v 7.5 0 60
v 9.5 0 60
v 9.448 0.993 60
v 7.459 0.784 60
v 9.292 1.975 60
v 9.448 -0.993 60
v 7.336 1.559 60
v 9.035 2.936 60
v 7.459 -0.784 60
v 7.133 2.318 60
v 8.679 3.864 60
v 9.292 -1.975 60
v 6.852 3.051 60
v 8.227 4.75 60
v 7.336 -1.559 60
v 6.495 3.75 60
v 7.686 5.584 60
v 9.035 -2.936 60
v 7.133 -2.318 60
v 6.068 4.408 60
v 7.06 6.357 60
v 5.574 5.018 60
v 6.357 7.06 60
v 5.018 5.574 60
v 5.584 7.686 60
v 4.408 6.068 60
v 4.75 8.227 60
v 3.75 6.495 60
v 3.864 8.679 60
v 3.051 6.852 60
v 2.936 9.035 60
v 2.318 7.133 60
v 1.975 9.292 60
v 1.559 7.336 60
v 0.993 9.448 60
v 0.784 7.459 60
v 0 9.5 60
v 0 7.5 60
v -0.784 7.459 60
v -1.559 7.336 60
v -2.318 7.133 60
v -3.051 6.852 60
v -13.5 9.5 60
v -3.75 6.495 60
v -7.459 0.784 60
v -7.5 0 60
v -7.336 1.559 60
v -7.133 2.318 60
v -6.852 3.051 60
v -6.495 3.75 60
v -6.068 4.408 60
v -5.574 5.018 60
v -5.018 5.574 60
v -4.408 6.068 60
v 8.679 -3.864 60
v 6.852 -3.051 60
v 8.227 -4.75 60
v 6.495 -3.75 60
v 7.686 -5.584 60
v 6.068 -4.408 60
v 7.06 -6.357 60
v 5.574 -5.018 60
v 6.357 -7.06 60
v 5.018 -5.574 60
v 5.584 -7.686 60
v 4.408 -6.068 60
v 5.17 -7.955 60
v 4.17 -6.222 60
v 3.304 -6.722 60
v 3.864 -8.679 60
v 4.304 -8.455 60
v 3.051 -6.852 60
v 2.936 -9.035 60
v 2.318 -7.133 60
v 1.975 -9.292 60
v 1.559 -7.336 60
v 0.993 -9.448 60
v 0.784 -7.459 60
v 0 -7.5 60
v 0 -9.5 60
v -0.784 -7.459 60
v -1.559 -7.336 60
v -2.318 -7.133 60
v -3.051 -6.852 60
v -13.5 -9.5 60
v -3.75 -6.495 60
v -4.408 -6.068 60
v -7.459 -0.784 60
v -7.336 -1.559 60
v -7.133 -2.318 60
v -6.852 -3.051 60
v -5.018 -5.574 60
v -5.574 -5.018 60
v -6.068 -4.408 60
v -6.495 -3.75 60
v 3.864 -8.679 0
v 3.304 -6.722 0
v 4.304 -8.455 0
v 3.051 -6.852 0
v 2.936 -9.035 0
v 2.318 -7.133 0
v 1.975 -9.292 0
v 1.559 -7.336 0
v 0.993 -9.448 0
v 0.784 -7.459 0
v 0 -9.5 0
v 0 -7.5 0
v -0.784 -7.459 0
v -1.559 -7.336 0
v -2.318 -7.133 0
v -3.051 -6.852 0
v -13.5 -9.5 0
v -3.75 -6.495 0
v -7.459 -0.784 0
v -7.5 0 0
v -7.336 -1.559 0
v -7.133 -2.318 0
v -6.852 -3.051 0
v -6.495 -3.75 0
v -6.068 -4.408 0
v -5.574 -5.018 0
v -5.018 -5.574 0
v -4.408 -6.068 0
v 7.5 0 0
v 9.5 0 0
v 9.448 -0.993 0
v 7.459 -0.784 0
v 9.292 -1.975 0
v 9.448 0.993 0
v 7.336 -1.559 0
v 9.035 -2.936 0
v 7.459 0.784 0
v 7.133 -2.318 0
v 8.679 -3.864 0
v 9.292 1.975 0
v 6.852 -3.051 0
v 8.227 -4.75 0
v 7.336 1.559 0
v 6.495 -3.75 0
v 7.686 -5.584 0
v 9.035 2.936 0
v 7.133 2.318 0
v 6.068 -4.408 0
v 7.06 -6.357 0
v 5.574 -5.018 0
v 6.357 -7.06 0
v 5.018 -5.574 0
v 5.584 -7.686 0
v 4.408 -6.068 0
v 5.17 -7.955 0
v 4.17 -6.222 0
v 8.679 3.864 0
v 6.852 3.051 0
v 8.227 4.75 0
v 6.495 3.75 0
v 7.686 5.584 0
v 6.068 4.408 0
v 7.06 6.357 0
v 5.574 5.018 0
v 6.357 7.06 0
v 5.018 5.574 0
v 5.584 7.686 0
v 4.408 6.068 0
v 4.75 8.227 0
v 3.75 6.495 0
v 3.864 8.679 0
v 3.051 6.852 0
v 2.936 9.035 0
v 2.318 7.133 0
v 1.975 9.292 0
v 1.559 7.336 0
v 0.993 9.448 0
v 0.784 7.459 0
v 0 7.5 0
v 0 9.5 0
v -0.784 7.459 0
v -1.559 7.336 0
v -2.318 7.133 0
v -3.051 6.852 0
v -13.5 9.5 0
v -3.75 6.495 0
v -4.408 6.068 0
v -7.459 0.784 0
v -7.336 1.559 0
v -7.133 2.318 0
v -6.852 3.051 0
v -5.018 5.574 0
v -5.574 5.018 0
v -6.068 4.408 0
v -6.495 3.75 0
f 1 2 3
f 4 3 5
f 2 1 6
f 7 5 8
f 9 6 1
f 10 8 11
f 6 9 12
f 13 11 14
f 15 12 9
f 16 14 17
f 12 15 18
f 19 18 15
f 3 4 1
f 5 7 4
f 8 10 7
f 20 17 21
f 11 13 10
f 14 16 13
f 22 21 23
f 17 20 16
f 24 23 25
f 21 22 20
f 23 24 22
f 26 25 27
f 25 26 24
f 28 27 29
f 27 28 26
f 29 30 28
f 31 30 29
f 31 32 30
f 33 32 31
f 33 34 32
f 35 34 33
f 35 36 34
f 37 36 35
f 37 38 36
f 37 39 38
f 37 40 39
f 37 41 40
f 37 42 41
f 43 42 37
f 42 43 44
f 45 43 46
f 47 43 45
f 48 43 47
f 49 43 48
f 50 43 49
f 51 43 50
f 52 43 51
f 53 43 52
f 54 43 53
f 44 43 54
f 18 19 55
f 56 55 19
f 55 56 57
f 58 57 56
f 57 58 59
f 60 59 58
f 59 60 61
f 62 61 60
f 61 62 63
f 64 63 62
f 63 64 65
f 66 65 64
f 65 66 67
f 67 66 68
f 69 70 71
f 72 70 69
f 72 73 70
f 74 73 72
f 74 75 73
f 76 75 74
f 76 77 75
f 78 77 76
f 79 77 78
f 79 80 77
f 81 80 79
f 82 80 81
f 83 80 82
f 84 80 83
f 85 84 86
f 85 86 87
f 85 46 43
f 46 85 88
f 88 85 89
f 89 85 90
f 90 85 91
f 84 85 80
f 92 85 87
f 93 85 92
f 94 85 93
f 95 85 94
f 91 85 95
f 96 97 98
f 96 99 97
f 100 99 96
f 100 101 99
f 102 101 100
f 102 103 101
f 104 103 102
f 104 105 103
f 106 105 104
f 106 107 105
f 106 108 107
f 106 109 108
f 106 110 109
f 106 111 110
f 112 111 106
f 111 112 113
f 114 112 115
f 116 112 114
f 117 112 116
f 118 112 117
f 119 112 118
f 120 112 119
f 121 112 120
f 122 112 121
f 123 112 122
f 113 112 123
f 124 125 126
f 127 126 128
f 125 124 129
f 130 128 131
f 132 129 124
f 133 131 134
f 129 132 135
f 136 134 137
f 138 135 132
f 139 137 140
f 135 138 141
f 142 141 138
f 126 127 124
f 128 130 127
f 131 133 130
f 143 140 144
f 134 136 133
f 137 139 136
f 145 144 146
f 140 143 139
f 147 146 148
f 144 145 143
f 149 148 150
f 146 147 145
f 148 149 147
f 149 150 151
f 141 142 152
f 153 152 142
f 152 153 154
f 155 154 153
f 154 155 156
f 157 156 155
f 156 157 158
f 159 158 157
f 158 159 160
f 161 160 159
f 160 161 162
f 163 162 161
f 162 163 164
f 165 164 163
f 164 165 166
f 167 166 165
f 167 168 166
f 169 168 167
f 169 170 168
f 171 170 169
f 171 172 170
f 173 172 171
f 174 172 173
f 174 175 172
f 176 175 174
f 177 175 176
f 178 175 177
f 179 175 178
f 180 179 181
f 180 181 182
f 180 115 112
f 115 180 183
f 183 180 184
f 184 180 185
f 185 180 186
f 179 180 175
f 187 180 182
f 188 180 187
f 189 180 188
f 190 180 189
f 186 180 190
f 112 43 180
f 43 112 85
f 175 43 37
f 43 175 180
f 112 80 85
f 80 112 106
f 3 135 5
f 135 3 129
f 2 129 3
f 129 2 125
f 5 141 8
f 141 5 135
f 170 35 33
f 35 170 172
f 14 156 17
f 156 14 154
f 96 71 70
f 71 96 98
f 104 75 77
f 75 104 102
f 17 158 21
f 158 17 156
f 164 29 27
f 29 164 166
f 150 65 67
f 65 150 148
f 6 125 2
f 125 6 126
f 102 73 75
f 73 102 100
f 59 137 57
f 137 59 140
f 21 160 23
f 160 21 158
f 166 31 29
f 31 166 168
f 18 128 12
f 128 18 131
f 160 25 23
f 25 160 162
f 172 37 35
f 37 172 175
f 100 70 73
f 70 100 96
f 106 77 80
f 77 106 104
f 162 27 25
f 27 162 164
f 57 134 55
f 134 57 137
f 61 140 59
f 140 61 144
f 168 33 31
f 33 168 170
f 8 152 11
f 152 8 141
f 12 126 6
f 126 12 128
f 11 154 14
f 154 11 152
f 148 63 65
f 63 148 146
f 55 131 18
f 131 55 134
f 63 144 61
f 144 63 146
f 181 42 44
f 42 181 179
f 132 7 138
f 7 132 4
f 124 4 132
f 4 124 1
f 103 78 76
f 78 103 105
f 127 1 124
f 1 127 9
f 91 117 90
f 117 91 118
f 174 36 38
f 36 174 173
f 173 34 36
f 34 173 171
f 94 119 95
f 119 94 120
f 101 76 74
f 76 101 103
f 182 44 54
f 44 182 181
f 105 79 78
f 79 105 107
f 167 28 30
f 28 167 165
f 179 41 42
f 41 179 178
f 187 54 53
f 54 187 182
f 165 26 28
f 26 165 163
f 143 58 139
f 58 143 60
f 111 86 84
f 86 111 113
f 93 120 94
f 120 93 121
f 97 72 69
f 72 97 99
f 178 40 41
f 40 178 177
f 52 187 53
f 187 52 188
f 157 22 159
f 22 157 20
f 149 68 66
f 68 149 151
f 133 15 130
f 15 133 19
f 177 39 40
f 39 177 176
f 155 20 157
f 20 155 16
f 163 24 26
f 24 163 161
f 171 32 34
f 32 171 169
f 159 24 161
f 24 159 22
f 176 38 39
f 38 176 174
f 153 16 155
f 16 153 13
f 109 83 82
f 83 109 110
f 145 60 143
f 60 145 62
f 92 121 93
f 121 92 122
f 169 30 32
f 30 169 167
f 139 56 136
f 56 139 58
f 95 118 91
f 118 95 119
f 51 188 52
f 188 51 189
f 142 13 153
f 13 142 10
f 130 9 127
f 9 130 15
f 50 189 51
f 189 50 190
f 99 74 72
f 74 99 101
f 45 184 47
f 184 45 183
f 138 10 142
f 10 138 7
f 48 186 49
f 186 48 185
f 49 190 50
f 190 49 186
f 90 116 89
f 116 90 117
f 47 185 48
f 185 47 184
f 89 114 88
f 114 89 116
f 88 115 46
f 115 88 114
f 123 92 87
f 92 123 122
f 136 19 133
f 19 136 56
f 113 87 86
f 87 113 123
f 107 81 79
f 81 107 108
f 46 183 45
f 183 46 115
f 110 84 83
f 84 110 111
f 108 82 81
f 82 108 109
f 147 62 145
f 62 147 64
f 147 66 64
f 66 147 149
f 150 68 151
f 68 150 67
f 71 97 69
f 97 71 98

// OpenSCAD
// PRUSA iteration3
// Bearing holders
// GNU GPL v3
// Josef Průša <iam@josefprusa.cz> and contributors
// http://www.reprap.org/wiki/Prusa_Mendel
// http://prusamendel.org

bearing_diameter = 15;

module horizontal_bearing_base(bearings=1){
 translate(v=[0,0,6]) cube(size = [24,8+bearings*25,12], center = true);	
}
module horizontal_bearing_holes(bearings=1){
 cutter_lenght = 10+bearings*25;
 one_holder_lenght = 8+25;
 holder_lenght = 8+bearings*25;
 
 // Main bearing cut
 difference(){
  translate(v=[0,0,12+1.5]) rotate(a=[90,0,0]) translate(v=[0,0,-cutter_lenght/2]) cylinder(h = cutter_lenght, r=bearing_diameter/2, $fn=50);
  // Bearing retainers
  translate(v=[0,1-holder_lenght/2,3+1.5]) cube(size = [24,6,8], center = true);
  translate(v=[0,-1+holder_lenght/2,3+1.5]) cube(size = [24,6,8], center = true);
 }
 
 // Ziptie cutouts
 ziptie_cut_ofset = 0;
 for ( i = [0 : bearings-1] ){
  // For easier positioning I move them by half of one 
  // bearing holder then add each bearign lenght and then center again
  translate(v=[0,-holder_lenght/2,0]) translate(v=[0,one_holder_lenght/2+i*25,0]) difference(){
   union(){
    translate(v=[0,2-6-2,12]) rotate(a=[90,0,0]) translate(v=[0,0,0]) cylinder(h = 4, r=12.5, $fn=50);
    translate(v=[0,2+6+2,12]) rotate(a=[90,0,0]) translate(v=[0,0,0]) cylinder(h = 4, r=12.5, $fn=50);
   }
   translate(v=[0,10,12]) rotate(a=[90,0,0]) translate(v=[0,0,0]) cylinder(h = 24, r=10, $fn=50);
  }
 }
 
}

module horizontal_bearing_test(){
 difference(){
  horizontal_bearing_base(1);
  horizontal_bearing_holes(1);
 }
 translate(v=[30,0,0]) difference(){
  horizontal_bearing_base(2);
  horizontal_bearing_holes(2);
 }
 translate(v=[60,0,0]) difference(){
  horizontal_bearing_base(3);
  horizontal_bearing_holes(3);
 }
}



thinwall = 2;
bearing_size = bearing_diameter + 2 * thinwall;

module vertical_bearing_base(){
 translate(v=[-2-bearing_size/4,0,30]) cube(size = [4+bearing_size/2,bearing_size,60], center = true);
 cylinder(h = 60, r=bearing_size/2, $fn = 60);
}

module vertical_bearing_holes(){
  translate(v=[0,0,-1]) cylinder(h = 62, r=bearing_diameter/2, $fn = 60);
  rotate(a=[0,0,-60]) translate(v=[10,0,31]) cube(size = [10,1,62], center = true);
}

difference(){
vertical_bearing_base();
vertical_bearing_holes();
}
